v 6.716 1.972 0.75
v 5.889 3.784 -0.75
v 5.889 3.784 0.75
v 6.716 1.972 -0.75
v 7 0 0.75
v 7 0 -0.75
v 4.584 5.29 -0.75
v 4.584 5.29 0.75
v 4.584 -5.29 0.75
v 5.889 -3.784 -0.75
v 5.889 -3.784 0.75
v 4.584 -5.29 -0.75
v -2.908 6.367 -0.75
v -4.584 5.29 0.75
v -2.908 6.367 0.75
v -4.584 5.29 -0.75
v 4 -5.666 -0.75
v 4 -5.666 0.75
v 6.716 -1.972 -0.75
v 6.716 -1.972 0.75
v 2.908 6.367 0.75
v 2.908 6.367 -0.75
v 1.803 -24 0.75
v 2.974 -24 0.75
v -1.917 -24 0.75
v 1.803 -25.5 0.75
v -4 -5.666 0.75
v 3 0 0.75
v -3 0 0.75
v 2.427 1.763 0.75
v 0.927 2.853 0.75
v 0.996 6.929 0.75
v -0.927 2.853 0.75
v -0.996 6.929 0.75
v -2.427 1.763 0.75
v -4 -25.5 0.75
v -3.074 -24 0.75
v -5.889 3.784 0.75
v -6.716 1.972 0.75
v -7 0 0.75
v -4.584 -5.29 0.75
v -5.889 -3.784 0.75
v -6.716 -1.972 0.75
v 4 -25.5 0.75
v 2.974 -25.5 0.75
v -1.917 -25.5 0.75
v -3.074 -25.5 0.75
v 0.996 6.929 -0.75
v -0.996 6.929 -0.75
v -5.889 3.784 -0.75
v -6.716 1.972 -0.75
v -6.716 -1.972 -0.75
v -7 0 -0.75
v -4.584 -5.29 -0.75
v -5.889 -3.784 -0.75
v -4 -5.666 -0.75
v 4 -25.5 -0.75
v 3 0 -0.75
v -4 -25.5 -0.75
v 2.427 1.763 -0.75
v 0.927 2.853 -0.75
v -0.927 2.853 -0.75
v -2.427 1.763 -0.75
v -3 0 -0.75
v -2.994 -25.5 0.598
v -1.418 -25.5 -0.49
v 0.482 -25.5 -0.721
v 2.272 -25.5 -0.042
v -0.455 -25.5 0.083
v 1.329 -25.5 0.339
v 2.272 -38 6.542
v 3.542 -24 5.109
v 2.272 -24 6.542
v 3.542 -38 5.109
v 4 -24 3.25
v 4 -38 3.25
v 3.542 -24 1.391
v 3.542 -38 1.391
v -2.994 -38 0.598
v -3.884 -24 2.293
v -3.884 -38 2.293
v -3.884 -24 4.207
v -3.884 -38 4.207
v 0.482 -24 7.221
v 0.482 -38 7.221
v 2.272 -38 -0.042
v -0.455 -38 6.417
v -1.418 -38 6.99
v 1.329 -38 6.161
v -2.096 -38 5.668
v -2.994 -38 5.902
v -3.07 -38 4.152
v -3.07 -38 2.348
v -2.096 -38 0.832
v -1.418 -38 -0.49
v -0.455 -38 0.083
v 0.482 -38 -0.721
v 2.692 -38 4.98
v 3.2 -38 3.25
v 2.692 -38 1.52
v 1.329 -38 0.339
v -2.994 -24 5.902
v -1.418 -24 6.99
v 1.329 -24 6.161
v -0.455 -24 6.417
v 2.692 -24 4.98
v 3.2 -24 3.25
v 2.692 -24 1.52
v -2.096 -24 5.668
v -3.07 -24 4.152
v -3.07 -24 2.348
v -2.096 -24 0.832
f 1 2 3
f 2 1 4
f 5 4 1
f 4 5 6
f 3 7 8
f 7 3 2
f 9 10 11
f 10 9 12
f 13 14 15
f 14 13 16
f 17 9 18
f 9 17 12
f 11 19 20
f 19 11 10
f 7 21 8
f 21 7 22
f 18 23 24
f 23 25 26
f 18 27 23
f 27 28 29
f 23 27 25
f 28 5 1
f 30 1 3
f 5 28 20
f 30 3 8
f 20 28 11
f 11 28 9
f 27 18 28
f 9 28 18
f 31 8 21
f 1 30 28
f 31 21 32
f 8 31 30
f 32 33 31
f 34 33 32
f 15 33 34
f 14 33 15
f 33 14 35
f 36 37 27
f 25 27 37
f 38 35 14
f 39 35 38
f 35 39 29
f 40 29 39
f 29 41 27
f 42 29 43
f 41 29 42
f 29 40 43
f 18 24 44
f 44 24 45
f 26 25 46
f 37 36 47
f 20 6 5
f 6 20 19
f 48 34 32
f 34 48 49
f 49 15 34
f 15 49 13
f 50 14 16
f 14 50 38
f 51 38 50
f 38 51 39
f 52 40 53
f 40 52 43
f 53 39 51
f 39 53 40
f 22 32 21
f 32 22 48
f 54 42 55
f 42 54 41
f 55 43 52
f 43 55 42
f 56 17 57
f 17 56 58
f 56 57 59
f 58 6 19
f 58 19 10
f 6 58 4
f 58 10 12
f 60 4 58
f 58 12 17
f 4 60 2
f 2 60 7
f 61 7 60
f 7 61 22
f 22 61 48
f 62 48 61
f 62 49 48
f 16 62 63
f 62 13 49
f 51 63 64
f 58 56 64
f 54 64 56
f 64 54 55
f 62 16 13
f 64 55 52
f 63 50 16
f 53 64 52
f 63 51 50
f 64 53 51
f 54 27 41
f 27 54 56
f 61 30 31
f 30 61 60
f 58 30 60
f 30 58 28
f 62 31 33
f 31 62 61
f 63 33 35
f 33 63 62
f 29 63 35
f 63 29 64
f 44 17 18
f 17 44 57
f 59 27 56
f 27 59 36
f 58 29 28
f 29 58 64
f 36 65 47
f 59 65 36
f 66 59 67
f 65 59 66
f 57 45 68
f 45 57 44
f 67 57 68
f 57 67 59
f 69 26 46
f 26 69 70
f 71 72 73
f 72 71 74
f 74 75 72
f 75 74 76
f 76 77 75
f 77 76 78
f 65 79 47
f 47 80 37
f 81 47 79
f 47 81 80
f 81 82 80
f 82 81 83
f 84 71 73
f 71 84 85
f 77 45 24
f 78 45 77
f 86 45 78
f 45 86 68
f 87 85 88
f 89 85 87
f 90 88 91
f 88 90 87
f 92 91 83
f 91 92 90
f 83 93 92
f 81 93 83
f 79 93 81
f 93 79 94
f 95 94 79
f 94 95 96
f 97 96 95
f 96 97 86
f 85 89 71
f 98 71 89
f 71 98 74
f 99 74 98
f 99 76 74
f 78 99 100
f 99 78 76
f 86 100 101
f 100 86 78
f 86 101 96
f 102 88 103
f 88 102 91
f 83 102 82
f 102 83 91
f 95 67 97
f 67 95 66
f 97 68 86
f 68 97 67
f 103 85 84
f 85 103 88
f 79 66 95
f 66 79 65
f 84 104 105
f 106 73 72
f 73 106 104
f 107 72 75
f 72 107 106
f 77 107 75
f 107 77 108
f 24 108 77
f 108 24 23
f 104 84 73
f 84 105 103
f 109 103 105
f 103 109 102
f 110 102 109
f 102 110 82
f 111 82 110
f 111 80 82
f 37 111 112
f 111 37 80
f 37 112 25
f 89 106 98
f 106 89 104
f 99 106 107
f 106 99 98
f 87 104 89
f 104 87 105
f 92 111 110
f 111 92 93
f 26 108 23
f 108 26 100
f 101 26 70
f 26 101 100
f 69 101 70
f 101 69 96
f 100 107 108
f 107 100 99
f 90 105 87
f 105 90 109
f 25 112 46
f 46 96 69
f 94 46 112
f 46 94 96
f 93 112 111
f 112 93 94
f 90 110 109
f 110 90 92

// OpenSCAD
// Parameters
type_selector = 1; //[0:1:1]
thickness = 1.5; //[0.8:3:0.1]
width = 8; //[4:16:0.5]
outer_diameter = 14; //[8:28:0.5]
inner_diameter = 6; //[3:14:0.5]
overall_length = 32; //[18:64:1]
crimp_length = 14; //[0:30:1]
aux_hole_diameter = 4; //[0:10:0.5]
bend_angle_deg = 45; //[0:90:1]
transition_length = 1; //[0.5:3:0.1]
overlap = 1; //[0.5:2:0.1]
eps = 0.2; //[0.05:0.5:0.05]
barrel_wall = 0.8; //[0.4:2:0.1]
barrel_outer_diameter = 8; //[5:16:0.5]

// Ring Terminal - complete geometry
module ring_terminal() {
  color("Silver") {
    // Ring end with bolt hole
    difference() {
      translate([0, 0, 0])
        cylinder(r=outer_diameter/2, h=thickness, center=true);
      translate([0, 0, 0])
        cylinder(r=inner_diameter/2, h=thickness + 2*eps, center=true);
    }
    
    // Tab shank
    translate([0, -(overall_length - outer_diameter/2)/2, 0])
      cube([width, overall_length - outer_diameter/2, thickness], center=true);
    
    // Transition
    translate([0, -(overall_length - outer_diameter/2) + transition_length/2 - overlap/2, 0])
      cube([width, transition_length, thickness], center=true);
  }
}

// Ring Terminal Assembly - complete geometry
module ring_terminal_assembly() {
  if (type_selector == 1) {
    // Crimp barrel style
    color("Silver") {
      union() {
        ring_terminal();
        difference() {
          translate([0, -(overall_length - outer_diameter/2) - crimp_length/2 + overlap, barrel_outer_diameter/2 - thickness/2])
            rotate([90, 0, 0])
            cylinder(r=barrel_outer_diameter/2, h=crimp_length, center=true);
          translate([0, -(overall_length - outer_diameter/2) - crimp_length/2 + overlap, barrel_outer_diameter/2 - thickness/2])
            rotate([90, 0, 0])
            cylinder(r=(barrel_outer_diameter - 2*barrel_wall)/2, h=crimp_length + 2*eps, center=true);
        }
      }
    }
  } else {
    // Bent-tab style
    color("Silver") {
      union() {
        ring_terminal();
        rotate([bend_angle_deg, 0, 0])
          difference() {
            translate([0, -(overall_length - outer_diameter/2) - width/2 + overlap, 0])
              cylinder(r=width/2, h=thickness, center=true);
            translate([0, -(overall_length - outer_diameter/2) - width/2 + overlap, 0])
              cylinder(r=aux_hole_diameter/2, h=thickness + 2*eps, center=true);
          }
      }
    }
  }
}

// Assembly
module assembly() {
  ring_terminal_assembly();
}

assembly();
